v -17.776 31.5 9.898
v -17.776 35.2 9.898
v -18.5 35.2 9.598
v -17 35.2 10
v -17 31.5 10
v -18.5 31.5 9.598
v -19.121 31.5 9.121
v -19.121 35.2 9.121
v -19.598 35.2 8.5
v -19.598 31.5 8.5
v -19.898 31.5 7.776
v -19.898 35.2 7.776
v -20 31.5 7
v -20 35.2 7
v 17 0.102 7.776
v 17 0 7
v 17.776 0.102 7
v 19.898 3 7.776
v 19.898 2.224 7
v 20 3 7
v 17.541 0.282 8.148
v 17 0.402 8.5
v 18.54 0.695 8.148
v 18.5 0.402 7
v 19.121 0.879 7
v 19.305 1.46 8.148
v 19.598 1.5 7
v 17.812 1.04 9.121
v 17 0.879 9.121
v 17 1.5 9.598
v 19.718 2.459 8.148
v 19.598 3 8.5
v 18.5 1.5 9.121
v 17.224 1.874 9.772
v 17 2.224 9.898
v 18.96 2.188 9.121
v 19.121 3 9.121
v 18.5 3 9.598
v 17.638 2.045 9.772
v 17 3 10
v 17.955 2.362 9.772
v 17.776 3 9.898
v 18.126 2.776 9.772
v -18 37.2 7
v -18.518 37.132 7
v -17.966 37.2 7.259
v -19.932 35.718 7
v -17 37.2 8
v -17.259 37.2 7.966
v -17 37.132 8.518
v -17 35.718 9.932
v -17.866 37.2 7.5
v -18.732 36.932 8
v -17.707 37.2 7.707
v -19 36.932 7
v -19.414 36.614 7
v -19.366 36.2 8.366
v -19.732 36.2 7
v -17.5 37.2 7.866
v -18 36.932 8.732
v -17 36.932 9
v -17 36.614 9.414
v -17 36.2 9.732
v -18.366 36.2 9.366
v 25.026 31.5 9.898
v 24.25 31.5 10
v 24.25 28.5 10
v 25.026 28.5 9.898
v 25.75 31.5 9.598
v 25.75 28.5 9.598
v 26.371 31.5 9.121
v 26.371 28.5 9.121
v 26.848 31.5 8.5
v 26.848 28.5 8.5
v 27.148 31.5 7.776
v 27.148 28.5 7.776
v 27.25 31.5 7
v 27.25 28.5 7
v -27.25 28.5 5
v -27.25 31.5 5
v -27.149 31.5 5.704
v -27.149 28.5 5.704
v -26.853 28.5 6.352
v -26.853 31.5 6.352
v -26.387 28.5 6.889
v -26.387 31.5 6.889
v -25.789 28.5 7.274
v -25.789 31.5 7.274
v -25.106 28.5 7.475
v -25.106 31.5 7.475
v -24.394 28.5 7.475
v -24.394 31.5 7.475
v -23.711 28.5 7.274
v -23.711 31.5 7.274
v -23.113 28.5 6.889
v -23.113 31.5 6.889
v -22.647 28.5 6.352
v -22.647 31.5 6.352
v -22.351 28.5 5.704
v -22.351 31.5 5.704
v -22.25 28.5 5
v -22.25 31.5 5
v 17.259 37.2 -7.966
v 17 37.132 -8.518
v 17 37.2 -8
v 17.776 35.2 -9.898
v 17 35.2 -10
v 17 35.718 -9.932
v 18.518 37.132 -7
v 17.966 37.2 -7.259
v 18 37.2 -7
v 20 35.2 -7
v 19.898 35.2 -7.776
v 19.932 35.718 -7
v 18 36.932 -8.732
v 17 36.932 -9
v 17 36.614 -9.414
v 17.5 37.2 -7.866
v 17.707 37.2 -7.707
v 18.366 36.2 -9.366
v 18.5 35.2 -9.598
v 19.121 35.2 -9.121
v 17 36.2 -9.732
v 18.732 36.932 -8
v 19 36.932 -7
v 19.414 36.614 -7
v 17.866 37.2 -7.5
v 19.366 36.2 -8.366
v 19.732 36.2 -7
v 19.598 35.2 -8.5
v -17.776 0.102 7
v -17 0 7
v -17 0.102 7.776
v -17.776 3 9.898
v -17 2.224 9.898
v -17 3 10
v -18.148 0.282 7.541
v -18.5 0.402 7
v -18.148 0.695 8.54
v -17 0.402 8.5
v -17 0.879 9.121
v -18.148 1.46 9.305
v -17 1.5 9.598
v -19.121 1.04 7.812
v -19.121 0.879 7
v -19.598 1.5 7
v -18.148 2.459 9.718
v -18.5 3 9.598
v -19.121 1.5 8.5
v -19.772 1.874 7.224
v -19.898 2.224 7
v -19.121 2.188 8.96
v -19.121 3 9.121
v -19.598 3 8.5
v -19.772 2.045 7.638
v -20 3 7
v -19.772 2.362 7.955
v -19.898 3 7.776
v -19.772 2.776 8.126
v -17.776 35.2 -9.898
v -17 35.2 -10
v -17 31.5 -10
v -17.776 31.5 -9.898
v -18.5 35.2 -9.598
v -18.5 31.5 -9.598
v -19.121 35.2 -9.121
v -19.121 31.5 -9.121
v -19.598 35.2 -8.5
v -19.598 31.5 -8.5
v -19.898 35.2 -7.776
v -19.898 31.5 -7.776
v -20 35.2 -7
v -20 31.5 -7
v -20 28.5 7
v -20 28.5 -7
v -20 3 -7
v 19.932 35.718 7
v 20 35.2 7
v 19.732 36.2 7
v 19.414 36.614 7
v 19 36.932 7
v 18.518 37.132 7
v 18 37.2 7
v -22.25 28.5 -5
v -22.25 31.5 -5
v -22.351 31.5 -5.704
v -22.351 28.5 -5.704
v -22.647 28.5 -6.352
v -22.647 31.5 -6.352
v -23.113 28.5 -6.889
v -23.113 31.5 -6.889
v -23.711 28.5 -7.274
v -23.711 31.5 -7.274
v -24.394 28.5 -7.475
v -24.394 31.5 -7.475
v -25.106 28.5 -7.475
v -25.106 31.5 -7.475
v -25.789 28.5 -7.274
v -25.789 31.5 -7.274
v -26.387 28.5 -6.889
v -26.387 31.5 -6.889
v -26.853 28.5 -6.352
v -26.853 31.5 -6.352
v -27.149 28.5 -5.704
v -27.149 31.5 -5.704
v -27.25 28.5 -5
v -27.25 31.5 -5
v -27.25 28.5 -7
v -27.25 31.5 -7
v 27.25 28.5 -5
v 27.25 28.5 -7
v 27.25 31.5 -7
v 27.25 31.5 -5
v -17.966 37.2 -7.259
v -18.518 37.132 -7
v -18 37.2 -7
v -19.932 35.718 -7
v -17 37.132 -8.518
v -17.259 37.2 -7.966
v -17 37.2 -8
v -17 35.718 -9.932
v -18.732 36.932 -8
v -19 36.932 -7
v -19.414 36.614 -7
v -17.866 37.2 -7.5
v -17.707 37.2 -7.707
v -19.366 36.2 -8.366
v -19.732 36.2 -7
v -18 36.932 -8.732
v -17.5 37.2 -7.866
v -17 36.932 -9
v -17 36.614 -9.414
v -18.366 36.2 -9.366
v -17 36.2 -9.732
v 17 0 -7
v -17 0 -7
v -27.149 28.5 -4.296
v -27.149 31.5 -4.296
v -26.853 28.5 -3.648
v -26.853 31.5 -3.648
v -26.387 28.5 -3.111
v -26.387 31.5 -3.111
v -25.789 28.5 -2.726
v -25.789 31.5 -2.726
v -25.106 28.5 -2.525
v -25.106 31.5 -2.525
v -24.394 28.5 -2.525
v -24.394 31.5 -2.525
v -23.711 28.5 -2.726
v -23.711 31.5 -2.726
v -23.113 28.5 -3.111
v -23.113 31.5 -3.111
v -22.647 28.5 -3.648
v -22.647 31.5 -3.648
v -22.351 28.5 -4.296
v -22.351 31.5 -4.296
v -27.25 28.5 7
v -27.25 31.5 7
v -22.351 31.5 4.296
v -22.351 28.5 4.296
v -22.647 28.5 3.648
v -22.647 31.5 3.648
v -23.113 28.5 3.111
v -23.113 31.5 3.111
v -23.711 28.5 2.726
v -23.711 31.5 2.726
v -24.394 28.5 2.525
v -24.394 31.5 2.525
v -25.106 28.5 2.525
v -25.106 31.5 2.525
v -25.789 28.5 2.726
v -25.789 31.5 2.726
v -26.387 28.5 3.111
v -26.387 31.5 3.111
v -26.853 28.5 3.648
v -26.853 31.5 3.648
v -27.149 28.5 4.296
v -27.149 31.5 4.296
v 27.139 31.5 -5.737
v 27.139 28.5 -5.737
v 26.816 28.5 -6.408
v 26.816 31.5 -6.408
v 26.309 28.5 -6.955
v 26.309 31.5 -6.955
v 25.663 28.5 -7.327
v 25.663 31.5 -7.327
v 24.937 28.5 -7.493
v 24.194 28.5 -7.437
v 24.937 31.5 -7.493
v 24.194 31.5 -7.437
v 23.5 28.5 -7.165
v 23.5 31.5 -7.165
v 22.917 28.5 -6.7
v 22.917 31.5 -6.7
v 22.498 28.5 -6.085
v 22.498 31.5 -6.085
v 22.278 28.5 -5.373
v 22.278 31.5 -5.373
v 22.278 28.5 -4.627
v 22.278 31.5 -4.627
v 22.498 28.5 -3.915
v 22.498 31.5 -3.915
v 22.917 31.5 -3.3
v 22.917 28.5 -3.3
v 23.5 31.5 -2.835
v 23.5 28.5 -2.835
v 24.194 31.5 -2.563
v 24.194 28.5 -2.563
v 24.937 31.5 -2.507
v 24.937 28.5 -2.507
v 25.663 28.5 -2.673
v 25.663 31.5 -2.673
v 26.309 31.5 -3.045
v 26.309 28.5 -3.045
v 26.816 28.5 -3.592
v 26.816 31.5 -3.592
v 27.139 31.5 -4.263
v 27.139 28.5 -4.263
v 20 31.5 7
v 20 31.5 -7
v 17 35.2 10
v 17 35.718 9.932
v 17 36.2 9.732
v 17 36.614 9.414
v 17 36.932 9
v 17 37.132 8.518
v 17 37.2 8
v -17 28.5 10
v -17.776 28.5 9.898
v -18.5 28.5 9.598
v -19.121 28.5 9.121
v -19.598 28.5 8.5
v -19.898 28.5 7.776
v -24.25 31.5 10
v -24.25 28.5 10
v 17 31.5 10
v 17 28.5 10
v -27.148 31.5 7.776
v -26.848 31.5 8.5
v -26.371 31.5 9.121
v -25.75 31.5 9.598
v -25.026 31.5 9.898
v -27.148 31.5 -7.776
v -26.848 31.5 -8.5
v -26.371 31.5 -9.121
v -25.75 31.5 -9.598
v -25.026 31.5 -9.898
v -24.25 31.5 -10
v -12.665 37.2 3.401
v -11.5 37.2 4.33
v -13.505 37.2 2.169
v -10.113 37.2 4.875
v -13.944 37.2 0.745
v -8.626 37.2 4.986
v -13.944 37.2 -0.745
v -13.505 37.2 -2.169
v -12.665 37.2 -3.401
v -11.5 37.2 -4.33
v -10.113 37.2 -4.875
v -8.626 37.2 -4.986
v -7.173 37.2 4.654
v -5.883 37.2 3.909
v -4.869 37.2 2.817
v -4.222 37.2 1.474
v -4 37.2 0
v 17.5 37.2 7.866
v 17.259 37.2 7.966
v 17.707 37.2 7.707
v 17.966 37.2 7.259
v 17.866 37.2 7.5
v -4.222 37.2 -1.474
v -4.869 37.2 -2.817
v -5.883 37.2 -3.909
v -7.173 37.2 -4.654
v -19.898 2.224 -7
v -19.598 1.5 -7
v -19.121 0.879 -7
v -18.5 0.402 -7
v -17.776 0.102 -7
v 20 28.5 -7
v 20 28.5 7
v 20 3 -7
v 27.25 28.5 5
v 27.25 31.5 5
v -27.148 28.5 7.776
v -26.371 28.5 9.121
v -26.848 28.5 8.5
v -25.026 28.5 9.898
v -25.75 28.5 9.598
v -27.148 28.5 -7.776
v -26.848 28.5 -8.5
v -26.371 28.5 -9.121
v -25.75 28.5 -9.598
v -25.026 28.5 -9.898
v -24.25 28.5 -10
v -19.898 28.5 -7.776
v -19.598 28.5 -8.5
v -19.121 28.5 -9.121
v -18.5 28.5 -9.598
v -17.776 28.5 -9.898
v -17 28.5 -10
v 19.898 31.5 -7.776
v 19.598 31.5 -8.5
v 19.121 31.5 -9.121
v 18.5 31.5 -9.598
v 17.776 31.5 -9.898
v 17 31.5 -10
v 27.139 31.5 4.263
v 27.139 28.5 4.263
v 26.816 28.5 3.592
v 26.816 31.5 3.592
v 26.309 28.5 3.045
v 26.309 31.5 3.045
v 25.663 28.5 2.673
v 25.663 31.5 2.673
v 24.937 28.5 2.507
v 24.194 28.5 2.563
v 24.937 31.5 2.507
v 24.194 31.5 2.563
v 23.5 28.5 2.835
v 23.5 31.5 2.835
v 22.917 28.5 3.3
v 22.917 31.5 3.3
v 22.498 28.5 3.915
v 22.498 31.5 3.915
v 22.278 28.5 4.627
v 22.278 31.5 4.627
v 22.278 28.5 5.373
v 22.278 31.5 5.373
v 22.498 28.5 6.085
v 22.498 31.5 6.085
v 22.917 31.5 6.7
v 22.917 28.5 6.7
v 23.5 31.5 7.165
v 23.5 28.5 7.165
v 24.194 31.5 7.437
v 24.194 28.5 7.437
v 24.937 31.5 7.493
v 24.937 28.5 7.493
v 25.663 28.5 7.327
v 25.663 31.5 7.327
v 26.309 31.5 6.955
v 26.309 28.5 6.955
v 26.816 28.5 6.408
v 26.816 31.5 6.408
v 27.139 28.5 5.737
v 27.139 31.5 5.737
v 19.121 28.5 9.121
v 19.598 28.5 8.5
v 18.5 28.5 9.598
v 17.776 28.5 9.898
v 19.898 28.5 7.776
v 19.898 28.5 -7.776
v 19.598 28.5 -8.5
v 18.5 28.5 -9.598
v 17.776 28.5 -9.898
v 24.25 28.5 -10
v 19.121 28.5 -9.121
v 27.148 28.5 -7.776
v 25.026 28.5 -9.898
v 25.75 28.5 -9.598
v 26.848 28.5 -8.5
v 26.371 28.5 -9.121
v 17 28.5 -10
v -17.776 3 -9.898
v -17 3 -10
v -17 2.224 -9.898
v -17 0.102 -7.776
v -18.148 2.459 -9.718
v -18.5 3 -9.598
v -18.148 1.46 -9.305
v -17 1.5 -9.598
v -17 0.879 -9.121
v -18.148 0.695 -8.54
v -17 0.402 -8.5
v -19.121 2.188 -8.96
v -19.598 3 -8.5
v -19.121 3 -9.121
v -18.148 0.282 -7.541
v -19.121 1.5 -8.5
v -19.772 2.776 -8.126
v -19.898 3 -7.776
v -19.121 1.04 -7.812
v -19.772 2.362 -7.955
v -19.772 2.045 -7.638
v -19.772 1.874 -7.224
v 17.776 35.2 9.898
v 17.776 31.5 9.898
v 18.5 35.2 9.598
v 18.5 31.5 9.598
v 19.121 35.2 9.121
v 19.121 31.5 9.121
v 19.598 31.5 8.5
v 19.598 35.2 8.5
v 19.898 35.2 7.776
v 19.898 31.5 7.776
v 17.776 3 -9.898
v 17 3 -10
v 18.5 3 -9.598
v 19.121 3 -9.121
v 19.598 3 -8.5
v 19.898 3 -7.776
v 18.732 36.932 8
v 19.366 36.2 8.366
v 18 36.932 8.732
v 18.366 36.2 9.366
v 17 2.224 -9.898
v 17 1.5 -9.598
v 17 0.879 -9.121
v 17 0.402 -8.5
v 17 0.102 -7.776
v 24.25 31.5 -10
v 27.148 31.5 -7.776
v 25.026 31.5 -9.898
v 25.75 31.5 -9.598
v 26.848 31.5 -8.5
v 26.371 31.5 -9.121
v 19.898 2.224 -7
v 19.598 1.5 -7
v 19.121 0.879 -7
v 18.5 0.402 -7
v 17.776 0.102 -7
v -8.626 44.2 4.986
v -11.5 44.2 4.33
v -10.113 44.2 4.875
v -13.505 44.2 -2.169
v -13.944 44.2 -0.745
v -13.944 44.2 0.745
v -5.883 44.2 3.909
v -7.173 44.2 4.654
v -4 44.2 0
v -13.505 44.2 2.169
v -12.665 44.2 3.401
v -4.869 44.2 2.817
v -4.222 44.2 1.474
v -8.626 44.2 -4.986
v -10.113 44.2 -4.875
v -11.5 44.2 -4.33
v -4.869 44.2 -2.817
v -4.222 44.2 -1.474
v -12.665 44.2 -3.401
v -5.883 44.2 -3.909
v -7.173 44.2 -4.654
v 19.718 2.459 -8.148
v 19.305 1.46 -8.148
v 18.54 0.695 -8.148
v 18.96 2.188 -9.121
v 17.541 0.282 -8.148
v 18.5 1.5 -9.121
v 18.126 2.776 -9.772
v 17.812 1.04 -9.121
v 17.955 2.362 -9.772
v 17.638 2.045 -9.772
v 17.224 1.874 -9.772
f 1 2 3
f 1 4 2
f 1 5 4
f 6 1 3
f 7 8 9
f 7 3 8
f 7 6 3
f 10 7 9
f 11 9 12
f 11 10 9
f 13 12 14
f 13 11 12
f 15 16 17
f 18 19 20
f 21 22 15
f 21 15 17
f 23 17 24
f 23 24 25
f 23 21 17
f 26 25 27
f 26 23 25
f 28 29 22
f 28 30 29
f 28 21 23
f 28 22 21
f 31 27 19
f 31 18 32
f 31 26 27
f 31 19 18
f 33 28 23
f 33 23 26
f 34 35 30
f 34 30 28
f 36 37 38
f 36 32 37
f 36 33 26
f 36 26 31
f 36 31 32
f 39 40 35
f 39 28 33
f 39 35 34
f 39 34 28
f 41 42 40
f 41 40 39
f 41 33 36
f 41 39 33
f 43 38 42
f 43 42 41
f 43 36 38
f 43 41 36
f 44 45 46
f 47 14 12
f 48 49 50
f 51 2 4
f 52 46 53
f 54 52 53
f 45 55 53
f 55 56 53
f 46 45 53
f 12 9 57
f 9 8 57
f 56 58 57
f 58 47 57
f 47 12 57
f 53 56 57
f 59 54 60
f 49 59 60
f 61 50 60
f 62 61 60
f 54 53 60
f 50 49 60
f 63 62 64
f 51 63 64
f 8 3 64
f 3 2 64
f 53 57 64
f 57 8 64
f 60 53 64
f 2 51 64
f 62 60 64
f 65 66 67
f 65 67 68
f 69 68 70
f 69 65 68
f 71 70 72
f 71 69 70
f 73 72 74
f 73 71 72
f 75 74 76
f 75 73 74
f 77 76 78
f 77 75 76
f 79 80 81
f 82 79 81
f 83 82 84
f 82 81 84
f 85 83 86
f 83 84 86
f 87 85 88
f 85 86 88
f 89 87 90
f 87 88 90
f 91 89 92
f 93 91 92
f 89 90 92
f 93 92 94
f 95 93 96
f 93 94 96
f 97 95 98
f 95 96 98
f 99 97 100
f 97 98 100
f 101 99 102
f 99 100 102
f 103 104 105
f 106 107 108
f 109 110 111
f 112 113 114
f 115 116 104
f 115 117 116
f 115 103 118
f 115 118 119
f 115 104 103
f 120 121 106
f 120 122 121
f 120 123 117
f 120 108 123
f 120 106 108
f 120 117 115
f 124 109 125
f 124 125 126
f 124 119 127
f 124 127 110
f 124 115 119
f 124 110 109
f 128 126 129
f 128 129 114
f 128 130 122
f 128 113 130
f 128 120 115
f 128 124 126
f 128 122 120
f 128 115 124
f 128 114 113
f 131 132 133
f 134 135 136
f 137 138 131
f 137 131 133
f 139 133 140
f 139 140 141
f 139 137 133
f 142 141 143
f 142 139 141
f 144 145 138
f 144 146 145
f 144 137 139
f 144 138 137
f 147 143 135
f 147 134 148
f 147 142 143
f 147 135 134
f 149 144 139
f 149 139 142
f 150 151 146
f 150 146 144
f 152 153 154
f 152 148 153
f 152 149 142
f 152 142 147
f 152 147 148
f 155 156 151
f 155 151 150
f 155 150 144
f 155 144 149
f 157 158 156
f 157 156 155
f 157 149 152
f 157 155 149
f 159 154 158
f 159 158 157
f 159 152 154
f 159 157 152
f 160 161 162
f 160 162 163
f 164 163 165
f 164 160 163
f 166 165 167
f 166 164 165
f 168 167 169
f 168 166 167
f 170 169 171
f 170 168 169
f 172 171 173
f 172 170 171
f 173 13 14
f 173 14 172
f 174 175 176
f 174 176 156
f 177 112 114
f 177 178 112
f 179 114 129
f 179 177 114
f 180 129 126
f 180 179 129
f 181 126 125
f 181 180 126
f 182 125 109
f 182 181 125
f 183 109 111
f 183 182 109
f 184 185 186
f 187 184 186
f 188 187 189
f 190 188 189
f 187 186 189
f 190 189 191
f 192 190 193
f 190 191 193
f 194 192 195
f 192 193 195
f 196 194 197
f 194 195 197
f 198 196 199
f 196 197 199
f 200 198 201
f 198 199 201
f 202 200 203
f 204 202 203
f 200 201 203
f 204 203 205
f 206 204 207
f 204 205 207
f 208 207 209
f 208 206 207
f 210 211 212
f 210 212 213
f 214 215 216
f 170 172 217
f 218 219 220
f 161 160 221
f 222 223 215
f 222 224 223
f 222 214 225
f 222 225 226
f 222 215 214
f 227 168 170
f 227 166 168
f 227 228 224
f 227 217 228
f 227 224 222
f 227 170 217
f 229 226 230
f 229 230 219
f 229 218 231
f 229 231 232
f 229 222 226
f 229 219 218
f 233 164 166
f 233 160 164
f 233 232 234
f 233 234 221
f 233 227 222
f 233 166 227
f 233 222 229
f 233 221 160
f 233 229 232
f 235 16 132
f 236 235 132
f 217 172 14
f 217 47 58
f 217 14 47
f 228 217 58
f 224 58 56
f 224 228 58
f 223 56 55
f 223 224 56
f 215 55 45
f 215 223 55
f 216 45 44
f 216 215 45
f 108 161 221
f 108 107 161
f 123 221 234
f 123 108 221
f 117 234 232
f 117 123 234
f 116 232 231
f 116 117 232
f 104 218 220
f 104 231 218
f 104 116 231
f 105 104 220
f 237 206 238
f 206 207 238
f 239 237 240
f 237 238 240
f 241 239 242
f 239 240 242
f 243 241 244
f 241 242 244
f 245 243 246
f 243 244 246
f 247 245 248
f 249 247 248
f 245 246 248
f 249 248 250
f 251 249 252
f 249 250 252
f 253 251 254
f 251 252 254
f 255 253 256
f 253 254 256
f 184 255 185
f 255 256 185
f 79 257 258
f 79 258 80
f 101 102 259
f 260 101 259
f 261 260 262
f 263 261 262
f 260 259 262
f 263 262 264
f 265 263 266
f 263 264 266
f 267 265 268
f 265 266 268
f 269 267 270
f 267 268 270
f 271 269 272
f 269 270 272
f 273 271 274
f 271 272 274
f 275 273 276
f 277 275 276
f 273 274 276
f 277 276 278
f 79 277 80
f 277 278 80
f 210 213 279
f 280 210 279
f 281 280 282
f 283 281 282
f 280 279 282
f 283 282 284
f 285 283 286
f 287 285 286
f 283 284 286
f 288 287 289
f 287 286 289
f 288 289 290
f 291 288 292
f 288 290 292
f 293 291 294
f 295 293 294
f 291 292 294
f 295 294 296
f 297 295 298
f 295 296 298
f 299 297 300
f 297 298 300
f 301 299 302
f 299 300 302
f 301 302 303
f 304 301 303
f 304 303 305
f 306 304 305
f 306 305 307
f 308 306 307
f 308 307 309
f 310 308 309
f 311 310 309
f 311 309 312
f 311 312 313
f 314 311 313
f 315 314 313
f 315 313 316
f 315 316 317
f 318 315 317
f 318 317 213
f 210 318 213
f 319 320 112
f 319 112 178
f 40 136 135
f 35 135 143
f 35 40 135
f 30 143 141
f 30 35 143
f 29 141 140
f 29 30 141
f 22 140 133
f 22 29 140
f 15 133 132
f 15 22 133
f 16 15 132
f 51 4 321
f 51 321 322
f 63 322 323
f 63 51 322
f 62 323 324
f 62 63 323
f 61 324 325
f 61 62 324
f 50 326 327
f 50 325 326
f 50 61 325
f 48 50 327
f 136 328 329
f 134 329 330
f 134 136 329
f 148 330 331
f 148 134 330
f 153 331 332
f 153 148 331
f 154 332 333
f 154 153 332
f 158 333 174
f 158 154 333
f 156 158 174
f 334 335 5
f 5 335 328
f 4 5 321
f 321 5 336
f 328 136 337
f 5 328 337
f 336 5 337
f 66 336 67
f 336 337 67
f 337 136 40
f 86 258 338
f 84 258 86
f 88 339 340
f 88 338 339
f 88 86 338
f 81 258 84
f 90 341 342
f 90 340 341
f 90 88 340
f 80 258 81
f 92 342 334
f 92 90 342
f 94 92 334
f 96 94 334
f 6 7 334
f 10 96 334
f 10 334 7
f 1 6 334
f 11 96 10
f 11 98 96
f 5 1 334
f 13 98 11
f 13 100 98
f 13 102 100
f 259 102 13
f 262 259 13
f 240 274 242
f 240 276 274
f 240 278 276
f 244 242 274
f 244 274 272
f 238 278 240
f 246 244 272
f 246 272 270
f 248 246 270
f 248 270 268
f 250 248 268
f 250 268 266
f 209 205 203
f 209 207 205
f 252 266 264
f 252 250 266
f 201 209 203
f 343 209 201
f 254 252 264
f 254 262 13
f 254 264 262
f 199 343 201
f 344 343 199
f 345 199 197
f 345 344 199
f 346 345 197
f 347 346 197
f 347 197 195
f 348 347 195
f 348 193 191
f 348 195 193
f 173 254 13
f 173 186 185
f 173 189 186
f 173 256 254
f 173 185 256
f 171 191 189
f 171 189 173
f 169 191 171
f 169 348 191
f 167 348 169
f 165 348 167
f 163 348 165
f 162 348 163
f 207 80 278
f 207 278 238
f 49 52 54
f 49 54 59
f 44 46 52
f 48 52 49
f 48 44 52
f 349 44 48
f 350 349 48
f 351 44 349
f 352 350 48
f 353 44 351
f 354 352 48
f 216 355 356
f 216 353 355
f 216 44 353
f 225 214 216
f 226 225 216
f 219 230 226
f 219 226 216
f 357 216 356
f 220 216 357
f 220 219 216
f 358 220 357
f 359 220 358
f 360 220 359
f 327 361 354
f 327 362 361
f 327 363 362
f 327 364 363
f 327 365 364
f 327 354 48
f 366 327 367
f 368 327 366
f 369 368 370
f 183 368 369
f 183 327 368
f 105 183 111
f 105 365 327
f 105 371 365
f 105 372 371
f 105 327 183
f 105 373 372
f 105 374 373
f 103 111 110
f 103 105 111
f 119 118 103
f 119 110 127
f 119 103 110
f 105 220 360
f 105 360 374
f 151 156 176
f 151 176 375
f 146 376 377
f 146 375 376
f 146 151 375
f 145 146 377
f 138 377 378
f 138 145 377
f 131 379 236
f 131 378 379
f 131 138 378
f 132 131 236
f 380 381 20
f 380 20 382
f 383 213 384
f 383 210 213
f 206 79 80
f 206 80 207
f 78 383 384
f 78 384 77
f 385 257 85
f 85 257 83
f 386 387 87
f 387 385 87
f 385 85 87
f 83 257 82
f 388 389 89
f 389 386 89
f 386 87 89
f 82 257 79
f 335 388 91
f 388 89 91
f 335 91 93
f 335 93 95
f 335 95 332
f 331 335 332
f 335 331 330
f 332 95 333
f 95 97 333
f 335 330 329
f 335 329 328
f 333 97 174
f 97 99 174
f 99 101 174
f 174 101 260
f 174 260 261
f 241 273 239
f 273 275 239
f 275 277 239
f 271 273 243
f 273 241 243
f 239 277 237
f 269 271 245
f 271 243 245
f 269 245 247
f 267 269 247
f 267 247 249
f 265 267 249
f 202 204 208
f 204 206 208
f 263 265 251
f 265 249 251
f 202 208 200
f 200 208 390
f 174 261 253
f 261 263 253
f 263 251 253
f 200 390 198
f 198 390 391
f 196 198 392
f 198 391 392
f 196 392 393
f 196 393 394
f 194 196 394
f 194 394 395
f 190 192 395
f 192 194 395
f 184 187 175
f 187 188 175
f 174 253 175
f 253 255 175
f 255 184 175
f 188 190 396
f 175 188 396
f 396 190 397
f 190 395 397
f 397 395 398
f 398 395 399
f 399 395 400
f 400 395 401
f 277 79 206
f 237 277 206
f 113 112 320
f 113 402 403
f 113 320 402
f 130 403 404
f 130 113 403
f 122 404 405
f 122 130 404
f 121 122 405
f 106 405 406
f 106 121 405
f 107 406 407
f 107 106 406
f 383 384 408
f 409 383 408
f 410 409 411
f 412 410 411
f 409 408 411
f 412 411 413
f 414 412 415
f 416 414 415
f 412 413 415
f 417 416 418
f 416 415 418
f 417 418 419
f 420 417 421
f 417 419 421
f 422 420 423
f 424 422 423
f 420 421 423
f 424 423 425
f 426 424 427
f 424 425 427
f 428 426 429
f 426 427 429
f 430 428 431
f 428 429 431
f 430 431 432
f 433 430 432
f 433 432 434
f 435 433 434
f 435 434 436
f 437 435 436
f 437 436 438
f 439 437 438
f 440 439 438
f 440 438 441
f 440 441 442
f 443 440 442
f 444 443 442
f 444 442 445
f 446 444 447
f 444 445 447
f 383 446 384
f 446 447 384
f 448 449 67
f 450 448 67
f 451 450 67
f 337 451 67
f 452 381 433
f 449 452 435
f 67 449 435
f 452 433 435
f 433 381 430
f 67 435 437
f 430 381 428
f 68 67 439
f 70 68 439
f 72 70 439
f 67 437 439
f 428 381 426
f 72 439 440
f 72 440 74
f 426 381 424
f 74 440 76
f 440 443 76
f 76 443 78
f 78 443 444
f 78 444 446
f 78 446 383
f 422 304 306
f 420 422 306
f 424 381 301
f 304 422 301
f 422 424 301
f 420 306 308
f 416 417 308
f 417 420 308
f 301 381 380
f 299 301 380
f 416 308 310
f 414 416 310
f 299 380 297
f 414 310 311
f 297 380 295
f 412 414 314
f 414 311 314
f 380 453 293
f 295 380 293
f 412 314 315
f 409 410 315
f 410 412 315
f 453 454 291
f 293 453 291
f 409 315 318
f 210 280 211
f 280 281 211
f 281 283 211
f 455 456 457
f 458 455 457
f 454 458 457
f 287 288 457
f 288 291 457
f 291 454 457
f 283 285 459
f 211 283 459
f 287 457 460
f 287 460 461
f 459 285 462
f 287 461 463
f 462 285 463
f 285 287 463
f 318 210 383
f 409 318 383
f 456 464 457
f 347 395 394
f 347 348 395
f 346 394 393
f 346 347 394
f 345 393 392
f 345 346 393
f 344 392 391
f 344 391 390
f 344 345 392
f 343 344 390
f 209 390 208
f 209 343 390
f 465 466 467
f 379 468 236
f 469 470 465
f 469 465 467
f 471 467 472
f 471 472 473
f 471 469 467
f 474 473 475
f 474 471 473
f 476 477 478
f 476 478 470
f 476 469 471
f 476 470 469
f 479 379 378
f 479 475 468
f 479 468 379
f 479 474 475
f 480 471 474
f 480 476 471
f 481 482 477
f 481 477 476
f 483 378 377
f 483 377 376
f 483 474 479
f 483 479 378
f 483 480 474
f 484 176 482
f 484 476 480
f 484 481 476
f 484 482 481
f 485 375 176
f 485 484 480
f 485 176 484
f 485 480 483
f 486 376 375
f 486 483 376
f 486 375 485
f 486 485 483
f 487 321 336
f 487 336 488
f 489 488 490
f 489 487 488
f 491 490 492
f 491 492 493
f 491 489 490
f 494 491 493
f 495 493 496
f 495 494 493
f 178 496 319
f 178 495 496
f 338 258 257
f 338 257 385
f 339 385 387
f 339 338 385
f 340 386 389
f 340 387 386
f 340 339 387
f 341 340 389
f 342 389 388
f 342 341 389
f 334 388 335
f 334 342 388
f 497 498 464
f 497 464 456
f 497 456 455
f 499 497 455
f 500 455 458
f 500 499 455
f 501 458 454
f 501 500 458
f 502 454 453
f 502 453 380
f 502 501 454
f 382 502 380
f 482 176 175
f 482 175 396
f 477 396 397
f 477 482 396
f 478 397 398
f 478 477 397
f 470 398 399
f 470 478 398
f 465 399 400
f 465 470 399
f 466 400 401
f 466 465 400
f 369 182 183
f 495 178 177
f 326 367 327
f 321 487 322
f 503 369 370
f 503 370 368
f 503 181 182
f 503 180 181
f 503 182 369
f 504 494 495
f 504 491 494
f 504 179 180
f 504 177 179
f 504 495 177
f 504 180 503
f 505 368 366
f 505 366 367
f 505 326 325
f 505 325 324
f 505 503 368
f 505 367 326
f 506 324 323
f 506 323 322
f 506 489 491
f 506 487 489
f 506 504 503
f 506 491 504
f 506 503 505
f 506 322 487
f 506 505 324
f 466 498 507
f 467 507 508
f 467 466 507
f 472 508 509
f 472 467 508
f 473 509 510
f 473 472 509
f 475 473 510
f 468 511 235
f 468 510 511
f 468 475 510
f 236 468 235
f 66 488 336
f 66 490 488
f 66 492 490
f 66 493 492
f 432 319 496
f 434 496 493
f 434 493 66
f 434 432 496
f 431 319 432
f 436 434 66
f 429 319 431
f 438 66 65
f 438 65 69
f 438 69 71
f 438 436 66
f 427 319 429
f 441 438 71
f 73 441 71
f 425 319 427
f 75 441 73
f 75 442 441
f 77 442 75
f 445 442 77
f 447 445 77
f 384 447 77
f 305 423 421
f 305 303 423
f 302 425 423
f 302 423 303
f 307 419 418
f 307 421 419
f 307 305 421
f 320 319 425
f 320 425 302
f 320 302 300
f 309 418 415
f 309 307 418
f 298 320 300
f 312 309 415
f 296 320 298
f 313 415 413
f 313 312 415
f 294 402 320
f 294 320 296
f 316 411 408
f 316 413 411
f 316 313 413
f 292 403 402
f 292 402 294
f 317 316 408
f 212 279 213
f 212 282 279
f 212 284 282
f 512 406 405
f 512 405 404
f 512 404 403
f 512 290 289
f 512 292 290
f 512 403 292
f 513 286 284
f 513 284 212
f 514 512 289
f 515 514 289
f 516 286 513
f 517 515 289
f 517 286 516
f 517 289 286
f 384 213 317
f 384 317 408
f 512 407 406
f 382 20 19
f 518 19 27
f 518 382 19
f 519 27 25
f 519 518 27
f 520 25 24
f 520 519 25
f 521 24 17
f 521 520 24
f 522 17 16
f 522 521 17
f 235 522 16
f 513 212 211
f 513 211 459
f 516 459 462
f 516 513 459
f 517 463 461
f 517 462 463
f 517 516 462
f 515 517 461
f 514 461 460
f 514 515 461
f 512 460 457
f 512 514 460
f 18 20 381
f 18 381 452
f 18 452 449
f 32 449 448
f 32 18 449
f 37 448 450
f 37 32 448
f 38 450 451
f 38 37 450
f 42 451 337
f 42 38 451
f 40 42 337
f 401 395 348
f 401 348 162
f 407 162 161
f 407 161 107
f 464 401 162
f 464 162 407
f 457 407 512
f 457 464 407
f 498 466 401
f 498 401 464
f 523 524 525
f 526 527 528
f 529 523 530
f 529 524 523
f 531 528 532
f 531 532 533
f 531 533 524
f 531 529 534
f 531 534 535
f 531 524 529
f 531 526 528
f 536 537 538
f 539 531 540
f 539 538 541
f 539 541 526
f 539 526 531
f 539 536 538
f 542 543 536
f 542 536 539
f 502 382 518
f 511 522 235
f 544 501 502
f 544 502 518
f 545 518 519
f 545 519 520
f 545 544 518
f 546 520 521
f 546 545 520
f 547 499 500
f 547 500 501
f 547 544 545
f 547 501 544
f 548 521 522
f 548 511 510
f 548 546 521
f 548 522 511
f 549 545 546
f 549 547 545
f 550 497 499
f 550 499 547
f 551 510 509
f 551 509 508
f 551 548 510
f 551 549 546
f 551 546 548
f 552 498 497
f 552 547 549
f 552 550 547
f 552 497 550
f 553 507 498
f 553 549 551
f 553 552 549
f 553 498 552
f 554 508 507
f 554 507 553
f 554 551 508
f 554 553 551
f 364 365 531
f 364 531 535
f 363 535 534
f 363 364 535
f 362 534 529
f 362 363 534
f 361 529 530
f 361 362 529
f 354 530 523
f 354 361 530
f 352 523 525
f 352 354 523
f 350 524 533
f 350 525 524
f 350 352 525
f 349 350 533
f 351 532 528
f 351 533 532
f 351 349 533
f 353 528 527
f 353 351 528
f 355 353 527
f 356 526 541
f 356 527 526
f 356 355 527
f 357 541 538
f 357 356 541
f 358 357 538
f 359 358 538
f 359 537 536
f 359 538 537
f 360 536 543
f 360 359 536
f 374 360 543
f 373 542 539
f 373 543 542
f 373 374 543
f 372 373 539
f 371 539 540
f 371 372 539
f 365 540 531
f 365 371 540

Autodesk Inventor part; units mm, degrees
ref_plane "YZ Plane" through (0, 0, 0) normal (1, 0, 0) x (0, 1, 0)
ref_plane "XZ Plane" through (0, 0, 0) normal (0, 1, 0) x (-1, 0, 0)
ref_plane "XY Plane" through (0, 0, 0) normal (0, 0, 1) x (1, 0, 0)
sketch "Boceto1" plane through (0, 0, 0) normal (0, 1, 0) x (-1, 0, 0)
  line L0 (20, 10) -> (-20, 10)
  line L1 (-20, 10) -> (-20, -10)
  line L2 (-20, -10) -> (20, -10)
  line L3 (20, -10) -> (20, 10)
  point P0 (0, 0)
  point P1 (-20, 0)
  dimension "d0" = 20
  dimension "d1" = 40
  dimension "d2" = 10
  dimension "d3" = 20
extrude "Extrusión1" add sketch "Boceto1" along normal blind 28.5
fillet "Empalme1" radius 3 4 edges at (0, 0, 10) (20, 0, 0) (0, 0, -10) (-20, 0, 0)
fillet "Empalme2" radius 3 6 edges at (-20, 15.75, -10) (-19.1213, 0.8787, -9.1213) (-20, 15.75, 10) (-19.1213, 0.8787, 9.1213) (20, 15.75, 10) (19.1213, 0.8787, 9.1213)
fillet "Empalme3" radius 3 2 edges at (20, 15.75, -10) (19.1213, 0.8787, -9.1213)
sketch "Boceto2" plane through (0, 28.5, 0) normal (0, 1, 0) x (1, 0, 0)
  line L0 (-27.25, 10) -> (27.25, 10)
  line L1 (27.25, 10) -> (27.25, -10)
  line L2 (27.25, -10) -> (-27.25, -10)
  line L3 (-27.25, -10) -> (-27.25, 10)
  line L4 (17, 10) -> (-17, 10) projected
  line L5 (-17, -10) -> (17, -10) projected
  point P0 (0, 0)
  dimension "d9" = 0
  dimension "d10" = 0
  dimension "d11" = 54.5
  dimension "d12" = 27.25
extrude "Extrusión2" add sketch "Boceto2" along normal blind 3
fillet "Empalme4" radius 3 3 edges at (-27.25, 30, 10) (-27.25, 30, -10) (27.25, 30, 10)
fillet "Empalme5" radius 3 1 edges at (27.25, 30, -10)
sketch "Boceto3" plane through (0, 31.5, 0) normal (0, 1, 0) x (1, 0, 0)
  line L0 (-17, 10) -> (17, 10) projected
  line L1 (-24.25, -10) -> (24.25, -10) projected
  line L2 (-20, 10) -> (20, 10)
  line L3 (20, 10) -> (20, -10)
  line L4 (20, -10) -> (-20, -10)
  line L5 (-20, -10) -> (-20, 10)
  point P0 (0, 0)
  dimension "d17" = 20
  dimension "d18" = 20
extrude "Extrusión3" add sketch "Boceto3" along normal blind 5.7
fillet "Empalme6" radius 3 3 edges at (20, 34.35, -10) (20, 34.35, 10) (-20, 34.35, -10)
fillet "Empalme7" radius 2 7 edges at (-20, 37.2, 1.5) (-19.1213, 37.2, -9.1213) (0, 37.2, -10) (19.1213, 37.2, -9.1213) (20, 37.2, 0) (19.1213, 37.2, 9.1213) (-1.5, 37.2, 10)
fillet "Empalme8" radius 3 2 edges at (-20, 33.35, 10) (-19.4142, 36.6142, 9.4142)
sketch "Boceto4" plane through (0, 31.5, 0) normal (0, 1, 0) x (1, 0, 0)
  circle A0 centre (-24.75, 5) radius 2.5
  line L0 (-38.2556, 0) -> (37.7734, 0)
  line L1 (0, 20.4997) -> (0, -23.7455)
  circle A1 centre (-24.75, -5) radius 2.5
  circle A2 centre (24.75, 5) radius 2.5
  circle A3 centre (24.75, -5) radius 2.5
  point P0 (0, 0)
  dimension "d24" = 24.75
  dimension "d25" = 5
  dimension "d26" = 5
  dimension "d27" = 24.75
extrude "Extrusión4" cut sketch "Boceto4" against normal blind 5
sketch "Boceto5" plane through (0, 37.2, 0) normal (0, 1, 0) x (1, 0, 0)
  circle A0 centre (-9, 0) radius 5
  point P0 (0, 0)
  dimension "d30" = 10
  dimension "d31" = 9
extrude "Extrusión5" add sketch "Boceto5" along normal blind 7
equation "\"Radio_pliegue\" = Grosor"
equation "\"Anchura_desahogo_plegado\" = Grosor"
equation "\"Profundidad_desahogo_plegado\" = 0.5 * Grosor"
equation "\"Tamaño_destalonado\" = 4 * Grosor"
equation "\"Remanente_mínimo\" = 2 * Grosor"
equation "\"Radiodetransición\" = Radio_pliegue"
equation "\"Tamaño_de_radio_de_Jacobi\" = Radio_pliegue"
equation "\"TamañoSeparación\" = Grosor"
equation "\"Grosor\" = 0.5"
properties part number "Feedback 360"
